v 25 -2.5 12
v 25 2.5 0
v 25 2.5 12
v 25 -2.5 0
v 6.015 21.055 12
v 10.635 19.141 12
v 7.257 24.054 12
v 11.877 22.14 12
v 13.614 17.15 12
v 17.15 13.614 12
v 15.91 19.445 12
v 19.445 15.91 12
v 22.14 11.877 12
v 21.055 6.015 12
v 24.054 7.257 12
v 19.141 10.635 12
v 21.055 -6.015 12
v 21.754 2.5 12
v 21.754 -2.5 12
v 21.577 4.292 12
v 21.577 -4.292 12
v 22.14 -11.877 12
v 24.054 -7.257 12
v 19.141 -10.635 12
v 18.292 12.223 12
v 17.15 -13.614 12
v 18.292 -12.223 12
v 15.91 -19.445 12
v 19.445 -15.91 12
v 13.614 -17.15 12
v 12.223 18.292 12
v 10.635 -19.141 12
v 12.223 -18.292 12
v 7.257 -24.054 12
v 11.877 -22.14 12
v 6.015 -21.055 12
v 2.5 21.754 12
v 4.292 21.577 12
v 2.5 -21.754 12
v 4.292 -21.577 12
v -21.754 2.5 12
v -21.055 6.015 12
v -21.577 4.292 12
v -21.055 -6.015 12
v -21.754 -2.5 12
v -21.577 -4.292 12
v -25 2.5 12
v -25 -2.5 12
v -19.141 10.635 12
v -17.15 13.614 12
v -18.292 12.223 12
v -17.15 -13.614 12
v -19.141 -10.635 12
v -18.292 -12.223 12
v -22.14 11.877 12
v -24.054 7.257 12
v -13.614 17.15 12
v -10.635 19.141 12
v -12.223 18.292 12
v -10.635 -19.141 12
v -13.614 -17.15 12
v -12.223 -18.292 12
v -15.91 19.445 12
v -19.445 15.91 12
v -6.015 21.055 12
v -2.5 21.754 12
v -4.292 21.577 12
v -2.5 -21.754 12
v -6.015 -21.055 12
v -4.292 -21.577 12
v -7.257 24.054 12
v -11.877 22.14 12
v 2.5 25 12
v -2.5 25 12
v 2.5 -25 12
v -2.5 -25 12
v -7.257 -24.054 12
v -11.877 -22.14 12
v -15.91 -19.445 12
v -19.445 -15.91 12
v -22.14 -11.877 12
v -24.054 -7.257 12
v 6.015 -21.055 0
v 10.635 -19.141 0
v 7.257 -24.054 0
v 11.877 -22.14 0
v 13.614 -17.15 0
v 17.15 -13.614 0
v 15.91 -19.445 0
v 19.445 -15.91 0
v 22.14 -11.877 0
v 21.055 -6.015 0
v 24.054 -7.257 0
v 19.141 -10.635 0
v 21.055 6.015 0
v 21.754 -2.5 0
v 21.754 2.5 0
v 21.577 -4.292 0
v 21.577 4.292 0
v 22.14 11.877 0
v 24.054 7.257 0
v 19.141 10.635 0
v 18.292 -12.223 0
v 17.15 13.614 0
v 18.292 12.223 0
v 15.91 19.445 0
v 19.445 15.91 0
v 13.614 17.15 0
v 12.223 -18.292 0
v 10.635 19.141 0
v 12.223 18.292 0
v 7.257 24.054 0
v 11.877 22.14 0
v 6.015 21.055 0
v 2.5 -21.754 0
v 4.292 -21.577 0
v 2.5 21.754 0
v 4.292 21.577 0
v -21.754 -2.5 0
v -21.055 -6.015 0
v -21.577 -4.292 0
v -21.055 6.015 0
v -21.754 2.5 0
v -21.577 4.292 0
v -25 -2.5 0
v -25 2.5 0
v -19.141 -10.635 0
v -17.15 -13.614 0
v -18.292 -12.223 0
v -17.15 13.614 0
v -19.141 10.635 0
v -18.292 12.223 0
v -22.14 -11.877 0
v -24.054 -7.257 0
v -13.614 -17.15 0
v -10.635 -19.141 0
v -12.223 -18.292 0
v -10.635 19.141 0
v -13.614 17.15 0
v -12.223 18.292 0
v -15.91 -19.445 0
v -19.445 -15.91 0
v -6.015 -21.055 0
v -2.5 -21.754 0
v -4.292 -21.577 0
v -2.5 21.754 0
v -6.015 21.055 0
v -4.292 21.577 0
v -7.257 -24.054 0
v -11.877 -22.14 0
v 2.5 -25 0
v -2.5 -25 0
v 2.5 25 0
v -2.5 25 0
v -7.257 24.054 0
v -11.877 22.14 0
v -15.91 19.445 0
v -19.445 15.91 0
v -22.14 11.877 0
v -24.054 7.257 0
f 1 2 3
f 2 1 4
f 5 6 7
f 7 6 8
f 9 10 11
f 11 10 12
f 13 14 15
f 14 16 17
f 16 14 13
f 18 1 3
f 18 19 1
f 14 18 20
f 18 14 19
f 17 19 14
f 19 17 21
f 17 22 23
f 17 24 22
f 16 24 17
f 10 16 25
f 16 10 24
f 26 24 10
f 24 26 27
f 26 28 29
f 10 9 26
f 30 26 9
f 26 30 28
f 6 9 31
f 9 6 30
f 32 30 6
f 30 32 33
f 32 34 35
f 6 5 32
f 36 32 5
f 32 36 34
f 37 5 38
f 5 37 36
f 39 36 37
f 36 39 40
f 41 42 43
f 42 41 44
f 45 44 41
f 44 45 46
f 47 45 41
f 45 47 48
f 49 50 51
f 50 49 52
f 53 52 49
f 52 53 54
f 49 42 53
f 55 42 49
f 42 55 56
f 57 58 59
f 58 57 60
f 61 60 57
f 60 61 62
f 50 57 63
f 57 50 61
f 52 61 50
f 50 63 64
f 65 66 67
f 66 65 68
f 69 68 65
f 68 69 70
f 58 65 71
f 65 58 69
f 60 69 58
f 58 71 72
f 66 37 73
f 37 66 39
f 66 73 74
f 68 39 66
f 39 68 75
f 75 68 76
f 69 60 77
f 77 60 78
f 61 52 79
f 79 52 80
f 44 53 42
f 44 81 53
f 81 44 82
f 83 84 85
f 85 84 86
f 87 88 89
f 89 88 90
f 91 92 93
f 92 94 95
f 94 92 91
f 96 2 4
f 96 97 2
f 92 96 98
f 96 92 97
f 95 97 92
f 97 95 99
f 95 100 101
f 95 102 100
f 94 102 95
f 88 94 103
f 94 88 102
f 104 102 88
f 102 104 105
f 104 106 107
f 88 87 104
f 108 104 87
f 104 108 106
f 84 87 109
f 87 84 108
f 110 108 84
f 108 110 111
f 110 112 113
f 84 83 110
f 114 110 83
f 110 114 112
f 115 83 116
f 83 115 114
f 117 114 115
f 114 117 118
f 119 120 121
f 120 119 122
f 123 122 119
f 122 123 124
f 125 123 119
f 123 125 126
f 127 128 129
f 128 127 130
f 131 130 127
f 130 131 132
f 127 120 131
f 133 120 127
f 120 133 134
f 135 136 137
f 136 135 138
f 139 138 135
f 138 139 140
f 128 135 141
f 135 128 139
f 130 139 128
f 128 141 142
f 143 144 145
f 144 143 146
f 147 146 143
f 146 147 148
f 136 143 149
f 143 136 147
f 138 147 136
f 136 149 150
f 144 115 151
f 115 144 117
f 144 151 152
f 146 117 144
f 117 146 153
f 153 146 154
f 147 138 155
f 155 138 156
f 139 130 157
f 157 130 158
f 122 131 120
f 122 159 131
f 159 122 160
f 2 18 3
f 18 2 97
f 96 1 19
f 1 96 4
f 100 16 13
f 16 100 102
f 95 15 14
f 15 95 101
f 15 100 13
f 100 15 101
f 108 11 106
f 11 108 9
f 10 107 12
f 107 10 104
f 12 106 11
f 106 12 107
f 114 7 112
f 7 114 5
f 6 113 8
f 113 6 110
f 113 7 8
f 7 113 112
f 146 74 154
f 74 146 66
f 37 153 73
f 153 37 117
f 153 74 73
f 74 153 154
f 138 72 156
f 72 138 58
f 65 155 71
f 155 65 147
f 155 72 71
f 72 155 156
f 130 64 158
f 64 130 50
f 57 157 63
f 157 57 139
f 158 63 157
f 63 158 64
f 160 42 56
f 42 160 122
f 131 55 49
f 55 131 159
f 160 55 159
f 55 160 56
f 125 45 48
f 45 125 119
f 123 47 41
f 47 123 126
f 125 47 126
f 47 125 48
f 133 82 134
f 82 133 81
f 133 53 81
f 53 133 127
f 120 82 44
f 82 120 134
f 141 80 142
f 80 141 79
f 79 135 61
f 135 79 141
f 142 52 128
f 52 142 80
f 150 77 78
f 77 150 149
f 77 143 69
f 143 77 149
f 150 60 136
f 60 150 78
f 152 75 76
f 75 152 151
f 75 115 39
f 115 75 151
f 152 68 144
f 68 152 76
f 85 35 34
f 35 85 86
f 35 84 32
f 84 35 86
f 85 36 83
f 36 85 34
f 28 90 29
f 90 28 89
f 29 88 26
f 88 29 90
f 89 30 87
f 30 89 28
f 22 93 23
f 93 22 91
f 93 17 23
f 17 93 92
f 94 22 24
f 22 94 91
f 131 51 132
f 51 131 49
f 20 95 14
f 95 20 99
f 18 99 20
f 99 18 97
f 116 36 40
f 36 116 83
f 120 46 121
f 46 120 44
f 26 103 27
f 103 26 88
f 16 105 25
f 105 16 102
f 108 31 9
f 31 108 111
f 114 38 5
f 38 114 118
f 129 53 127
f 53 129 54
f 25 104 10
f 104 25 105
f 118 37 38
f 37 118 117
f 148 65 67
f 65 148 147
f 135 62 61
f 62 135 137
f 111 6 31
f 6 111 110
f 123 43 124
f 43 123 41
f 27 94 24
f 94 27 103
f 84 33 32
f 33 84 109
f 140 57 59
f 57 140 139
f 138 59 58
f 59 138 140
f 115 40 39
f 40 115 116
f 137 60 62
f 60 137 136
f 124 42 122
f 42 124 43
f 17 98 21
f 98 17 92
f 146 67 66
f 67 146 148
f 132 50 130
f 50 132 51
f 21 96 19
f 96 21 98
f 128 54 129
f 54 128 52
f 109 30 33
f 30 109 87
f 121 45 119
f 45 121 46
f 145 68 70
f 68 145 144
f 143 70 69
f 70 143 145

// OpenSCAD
$fn = 32;

// ----------------------------------------------------------------------
// Spur blank: plain gear blank
// ----------------------------------------------------------------------

// --- parameters (mm) ---
disc_r = 22;              // blank root radius
disc_t = 12;              // blank thickness
n_teeth = 16;             // stub tooth count
tooth_w = 5;              // tooth width at the root
tooth_h = 3;              // tooth height above the root

out_r = disc_r + tooth_h;  // tip radius
bbox_x = 50.0;  // measured width over the teeth
bbox_y = 50.0;  // measured depth over the teeth

union() {
  cylinder(r = disc_r, h = disc_t);
  for (i = [0 : n_teeth - 1])
    rotate([0, 0, i * 360 / n_teeth])
      translate([disc_r - 1, -tooth_w / 2, 0])
        cube([tooth_h + 1, tooth_w, disc_t]);
}
